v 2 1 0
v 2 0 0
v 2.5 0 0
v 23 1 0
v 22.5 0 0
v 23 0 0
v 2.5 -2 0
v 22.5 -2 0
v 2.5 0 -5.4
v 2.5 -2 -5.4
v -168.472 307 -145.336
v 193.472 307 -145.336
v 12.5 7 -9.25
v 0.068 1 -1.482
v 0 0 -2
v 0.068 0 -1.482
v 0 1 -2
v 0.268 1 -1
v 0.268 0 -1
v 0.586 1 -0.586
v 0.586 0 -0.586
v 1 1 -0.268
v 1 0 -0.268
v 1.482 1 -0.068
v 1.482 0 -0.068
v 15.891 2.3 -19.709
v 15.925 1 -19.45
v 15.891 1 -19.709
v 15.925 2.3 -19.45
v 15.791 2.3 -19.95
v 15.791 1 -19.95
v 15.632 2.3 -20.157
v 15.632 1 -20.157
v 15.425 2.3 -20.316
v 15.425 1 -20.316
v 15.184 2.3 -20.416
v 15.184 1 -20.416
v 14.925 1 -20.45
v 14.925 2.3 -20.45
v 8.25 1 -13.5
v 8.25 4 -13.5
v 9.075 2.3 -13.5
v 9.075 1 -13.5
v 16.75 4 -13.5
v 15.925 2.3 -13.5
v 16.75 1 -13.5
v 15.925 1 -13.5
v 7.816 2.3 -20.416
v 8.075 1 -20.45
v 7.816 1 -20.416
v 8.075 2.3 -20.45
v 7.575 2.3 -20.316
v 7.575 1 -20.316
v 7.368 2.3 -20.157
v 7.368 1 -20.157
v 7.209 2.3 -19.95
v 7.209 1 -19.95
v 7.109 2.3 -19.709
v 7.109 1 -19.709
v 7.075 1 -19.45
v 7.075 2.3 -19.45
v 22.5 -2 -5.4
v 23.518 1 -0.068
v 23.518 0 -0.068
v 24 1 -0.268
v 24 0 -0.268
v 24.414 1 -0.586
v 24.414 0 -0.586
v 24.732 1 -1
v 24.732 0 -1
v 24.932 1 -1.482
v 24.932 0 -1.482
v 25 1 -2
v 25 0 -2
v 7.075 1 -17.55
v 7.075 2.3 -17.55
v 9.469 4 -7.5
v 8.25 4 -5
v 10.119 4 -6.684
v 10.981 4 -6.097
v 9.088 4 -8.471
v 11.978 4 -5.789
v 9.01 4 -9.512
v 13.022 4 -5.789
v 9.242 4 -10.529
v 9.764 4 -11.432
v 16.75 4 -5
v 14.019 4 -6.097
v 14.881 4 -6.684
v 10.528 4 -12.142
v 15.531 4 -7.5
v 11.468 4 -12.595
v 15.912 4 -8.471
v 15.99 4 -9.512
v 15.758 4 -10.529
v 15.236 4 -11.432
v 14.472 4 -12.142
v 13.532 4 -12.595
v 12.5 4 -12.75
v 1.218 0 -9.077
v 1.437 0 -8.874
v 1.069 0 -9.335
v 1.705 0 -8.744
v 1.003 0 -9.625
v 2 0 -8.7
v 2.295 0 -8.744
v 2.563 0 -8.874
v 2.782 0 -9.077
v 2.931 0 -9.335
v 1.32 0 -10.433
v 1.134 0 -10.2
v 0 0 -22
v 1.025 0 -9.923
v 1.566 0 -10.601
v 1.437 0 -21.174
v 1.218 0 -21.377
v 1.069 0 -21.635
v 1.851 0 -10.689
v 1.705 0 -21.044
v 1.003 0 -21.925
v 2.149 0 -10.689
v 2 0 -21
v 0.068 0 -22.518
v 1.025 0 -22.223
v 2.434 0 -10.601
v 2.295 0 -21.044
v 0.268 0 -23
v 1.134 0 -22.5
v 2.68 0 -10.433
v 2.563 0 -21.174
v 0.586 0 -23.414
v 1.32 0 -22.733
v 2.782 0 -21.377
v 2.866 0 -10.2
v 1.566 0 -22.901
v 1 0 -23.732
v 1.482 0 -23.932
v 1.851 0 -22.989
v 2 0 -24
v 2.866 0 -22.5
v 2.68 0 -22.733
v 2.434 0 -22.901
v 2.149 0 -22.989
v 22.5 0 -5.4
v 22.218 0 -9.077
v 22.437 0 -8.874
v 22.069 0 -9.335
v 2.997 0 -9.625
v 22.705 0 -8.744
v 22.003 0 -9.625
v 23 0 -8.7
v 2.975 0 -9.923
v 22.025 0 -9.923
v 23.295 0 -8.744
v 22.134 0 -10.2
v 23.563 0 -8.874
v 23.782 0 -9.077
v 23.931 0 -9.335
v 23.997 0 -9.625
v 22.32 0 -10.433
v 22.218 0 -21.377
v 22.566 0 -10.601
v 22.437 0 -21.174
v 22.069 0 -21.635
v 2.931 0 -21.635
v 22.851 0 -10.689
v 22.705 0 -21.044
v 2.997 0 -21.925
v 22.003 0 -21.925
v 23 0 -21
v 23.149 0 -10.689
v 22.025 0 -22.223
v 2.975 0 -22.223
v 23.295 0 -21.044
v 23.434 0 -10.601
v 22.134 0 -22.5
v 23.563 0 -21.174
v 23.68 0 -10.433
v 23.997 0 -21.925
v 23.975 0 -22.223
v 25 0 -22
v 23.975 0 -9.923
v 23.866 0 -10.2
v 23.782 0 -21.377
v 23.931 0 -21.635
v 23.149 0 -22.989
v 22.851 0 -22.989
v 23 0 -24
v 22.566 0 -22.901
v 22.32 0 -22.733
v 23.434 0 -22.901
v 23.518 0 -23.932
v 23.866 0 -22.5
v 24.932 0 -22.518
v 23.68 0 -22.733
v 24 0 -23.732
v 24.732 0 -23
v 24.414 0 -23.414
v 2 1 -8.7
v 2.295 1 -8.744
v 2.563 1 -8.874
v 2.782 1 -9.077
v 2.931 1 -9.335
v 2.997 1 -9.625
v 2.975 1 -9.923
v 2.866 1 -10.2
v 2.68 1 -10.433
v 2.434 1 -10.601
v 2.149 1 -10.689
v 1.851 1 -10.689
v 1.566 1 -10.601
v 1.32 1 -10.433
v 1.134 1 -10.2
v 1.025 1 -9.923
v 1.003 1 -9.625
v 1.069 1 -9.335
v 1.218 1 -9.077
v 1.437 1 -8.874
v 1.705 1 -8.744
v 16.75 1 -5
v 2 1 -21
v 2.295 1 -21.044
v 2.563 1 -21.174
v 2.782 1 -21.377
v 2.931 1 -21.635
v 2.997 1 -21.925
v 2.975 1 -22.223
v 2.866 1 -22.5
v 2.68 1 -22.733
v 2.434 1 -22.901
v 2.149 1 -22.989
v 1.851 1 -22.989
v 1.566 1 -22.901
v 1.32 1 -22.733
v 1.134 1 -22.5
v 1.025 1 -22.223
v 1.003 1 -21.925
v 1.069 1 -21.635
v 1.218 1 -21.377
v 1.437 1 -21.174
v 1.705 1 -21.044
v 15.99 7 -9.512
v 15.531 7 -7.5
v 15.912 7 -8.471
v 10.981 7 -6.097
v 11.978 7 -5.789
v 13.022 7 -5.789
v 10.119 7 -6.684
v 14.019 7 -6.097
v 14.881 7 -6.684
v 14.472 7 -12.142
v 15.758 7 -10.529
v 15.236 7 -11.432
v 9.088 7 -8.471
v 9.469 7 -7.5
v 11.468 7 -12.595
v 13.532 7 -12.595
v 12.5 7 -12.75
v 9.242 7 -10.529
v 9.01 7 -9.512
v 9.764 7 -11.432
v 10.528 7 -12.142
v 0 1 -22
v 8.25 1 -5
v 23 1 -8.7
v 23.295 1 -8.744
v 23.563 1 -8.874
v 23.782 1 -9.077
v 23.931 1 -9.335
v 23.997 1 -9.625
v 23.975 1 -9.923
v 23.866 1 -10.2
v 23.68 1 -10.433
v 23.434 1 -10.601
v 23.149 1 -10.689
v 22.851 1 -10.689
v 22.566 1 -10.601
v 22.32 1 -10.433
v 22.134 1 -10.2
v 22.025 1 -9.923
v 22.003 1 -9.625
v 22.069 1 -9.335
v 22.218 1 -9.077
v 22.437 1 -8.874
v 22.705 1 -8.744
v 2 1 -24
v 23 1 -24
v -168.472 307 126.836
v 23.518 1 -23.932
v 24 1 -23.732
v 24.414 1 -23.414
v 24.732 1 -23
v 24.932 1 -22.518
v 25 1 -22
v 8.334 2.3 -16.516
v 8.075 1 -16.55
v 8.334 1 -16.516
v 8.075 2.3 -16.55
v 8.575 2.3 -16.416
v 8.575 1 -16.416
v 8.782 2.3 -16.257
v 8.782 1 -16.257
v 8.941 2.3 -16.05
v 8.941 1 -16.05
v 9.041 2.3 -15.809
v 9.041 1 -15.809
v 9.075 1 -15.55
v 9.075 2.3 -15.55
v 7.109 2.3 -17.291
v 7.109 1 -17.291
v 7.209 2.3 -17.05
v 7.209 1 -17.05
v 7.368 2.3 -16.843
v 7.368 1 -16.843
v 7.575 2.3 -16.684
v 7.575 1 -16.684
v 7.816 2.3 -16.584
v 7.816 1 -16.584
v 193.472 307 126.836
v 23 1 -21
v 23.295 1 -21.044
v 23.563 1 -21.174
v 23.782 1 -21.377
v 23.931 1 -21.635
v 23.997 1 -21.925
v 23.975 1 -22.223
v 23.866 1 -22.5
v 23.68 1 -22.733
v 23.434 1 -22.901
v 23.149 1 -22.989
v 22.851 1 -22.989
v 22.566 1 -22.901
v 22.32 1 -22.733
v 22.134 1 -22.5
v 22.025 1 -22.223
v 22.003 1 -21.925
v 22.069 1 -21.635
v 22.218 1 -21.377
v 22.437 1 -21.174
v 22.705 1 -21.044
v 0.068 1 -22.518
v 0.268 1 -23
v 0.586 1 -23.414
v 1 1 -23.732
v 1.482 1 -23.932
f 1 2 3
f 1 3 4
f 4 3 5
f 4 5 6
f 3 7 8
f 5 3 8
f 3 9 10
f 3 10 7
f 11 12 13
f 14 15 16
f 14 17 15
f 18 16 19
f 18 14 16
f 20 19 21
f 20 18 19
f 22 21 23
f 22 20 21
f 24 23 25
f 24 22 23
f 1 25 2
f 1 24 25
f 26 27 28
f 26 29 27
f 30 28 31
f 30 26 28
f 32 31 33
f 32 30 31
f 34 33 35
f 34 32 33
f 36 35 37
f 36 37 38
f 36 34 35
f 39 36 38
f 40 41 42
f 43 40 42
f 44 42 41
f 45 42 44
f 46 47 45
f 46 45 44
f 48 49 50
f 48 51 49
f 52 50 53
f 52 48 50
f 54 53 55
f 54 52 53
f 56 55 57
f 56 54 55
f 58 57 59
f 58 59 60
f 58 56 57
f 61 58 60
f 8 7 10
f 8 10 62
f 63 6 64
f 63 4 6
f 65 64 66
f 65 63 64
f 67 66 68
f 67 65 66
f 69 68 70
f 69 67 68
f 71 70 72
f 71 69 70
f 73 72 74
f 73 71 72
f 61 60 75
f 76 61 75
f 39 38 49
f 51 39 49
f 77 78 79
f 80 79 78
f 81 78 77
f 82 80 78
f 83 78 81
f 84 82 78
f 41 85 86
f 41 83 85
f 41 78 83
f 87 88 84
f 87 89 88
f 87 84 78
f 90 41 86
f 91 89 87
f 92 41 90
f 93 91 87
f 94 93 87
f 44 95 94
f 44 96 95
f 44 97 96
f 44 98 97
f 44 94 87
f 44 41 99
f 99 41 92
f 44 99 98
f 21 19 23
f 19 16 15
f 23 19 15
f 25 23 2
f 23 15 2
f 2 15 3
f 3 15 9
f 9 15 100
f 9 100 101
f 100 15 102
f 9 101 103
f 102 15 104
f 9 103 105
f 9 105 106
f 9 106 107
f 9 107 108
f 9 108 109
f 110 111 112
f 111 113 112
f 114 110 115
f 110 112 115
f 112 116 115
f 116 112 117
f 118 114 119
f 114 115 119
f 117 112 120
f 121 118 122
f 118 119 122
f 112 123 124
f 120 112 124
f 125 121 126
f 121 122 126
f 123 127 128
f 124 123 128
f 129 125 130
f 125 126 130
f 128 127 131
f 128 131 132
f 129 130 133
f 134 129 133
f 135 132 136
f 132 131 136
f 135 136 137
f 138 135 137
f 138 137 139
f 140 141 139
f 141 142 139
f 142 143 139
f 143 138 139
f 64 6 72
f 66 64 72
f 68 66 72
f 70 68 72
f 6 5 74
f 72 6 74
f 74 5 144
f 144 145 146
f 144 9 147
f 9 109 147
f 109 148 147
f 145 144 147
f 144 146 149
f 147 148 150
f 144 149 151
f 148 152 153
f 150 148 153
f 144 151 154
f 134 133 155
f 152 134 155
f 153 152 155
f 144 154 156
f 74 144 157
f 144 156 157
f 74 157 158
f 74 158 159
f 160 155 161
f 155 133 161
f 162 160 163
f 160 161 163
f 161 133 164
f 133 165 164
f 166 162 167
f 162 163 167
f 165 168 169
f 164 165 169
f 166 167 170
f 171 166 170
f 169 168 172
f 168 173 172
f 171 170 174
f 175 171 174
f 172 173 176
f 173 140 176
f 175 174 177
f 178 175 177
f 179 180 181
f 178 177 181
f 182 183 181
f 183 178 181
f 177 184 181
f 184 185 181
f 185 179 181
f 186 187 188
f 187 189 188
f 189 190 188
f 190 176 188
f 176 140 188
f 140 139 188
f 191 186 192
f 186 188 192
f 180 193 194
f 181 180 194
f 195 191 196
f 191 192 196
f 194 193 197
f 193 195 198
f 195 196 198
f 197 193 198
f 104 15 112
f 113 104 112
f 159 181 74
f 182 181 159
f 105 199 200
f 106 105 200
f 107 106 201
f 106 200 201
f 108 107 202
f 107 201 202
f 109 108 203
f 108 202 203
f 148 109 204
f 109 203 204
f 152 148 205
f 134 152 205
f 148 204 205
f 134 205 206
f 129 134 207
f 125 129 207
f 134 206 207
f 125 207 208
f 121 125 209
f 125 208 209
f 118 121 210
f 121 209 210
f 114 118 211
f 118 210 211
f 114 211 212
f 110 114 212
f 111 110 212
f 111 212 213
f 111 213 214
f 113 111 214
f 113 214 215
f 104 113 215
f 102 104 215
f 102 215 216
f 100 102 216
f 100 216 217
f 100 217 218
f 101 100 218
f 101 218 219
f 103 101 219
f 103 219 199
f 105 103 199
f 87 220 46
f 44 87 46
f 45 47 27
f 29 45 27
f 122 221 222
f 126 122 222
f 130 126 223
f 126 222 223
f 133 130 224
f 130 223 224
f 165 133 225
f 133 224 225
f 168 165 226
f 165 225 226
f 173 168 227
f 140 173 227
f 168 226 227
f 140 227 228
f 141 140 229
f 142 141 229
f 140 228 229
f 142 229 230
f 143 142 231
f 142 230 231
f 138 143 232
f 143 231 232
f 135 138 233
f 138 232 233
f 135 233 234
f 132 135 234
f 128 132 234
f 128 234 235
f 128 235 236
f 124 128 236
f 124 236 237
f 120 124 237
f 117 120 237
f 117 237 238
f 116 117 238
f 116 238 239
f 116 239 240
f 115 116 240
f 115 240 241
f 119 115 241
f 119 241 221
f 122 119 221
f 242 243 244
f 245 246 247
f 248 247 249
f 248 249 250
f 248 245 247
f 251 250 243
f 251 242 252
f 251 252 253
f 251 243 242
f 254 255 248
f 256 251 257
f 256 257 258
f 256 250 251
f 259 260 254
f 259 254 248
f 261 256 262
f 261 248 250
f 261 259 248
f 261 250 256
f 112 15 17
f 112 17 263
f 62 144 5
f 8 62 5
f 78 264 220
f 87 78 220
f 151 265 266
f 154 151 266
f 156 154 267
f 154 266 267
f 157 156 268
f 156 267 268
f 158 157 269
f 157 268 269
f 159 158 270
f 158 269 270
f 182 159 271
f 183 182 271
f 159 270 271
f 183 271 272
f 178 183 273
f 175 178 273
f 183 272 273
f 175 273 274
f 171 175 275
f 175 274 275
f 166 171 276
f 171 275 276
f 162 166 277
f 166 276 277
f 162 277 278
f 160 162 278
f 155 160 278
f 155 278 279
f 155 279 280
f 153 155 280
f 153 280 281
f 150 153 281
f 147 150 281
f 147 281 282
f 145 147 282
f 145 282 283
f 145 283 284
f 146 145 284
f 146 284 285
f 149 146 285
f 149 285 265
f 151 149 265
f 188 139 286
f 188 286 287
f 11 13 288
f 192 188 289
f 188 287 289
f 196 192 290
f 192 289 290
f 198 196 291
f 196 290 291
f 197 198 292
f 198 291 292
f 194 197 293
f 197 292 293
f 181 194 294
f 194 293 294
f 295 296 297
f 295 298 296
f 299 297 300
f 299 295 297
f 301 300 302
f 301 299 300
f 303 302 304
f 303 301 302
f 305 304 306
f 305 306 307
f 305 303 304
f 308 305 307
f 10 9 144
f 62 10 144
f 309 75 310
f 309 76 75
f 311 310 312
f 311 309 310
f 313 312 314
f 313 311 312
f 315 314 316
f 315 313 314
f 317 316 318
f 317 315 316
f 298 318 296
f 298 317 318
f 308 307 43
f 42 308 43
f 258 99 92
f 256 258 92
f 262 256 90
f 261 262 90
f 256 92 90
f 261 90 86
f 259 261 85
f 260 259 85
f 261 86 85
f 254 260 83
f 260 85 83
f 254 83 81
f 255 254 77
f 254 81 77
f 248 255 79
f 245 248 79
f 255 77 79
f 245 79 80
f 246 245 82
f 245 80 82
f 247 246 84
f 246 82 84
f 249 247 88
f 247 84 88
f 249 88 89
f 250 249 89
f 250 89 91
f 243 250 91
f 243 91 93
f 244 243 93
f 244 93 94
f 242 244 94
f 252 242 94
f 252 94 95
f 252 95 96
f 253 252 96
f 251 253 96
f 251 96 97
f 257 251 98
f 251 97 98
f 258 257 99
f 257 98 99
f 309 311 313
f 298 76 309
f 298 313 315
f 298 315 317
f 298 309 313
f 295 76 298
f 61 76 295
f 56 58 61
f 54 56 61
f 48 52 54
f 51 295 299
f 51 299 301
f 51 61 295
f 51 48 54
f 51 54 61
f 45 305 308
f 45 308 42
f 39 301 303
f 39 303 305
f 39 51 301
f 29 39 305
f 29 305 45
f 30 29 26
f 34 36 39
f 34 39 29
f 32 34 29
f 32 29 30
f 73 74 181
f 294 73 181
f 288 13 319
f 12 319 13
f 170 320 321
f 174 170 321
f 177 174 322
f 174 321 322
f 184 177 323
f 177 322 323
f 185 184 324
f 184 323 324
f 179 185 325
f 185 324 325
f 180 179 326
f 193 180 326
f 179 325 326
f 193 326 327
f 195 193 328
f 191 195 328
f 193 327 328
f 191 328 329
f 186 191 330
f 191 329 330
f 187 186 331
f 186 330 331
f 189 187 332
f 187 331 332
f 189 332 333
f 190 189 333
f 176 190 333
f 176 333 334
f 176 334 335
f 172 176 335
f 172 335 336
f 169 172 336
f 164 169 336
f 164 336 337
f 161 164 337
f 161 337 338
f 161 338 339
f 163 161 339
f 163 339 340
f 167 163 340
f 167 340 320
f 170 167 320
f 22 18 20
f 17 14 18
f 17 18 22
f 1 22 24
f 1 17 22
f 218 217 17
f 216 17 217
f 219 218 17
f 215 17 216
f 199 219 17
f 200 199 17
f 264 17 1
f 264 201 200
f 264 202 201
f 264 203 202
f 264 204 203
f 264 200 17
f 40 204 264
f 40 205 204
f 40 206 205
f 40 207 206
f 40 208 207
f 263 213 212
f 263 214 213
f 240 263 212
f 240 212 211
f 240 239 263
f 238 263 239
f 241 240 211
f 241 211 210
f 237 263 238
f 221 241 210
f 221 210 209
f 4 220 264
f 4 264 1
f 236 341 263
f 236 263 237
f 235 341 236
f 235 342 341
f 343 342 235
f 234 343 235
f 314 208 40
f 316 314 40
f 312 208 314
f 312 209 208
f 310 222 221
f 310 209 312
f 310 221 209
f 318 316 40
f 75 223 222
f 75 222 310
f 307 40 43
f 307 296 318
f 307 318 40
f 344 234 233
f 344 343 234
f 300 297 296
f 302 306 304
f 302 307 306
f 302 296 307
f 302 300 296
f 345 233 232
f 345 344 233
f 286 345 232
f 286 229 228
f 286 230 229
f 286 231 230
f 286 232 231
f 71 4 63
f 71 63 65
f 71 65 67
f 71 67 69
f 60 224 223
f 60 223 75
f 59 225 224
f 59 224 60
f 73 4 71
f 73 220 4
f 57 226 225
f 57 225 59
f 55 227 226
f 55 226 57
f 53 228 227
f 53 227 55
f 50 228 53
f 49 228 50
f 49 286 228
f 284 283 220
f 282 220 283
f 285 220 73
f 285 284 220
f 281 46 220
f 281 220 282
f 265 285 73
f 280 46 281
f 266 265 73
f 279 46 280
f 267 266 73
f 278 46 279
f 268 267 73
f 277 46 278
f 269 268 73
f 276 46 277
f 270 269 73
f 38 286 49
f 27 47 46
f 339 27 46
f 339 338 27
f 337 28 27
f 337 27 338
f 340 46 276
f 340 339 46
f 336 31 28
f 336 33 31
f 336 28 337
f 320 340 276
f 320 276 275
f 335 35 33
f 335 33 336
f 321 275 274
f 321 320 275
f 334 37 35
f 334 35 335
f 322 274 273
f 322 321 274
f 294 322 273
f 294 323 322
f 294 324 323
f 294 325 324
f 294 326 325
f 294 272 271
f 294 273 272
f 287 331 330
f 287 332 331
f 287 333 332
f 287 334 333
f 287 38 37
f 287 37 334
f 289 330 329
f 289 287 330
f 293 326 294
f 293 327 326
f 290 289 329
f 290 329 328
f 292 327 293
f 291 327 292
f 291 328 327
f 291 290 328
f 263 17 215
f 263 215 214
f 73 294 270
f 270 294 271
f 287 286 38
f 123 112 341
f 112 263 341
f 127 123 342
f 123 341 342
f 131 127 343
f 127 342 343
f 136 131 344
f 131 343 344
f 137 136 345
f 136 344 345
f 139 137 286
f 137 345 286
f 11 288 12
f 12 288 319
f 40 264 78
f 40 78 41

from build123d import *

# Parameters (mm, degrees)
SKETCH1_W           = 25
SKETCH1_H           = 24
BOSS_EXTRUDE1_DEPTH = 1
SKETCH2_W           = 8.5
SKETCH2_H           = 8.5
BOSS_EXTRUDE2_DEPTH = 3
SKETCH3_R           = 3.5
BOSS_EXTRUDE3_DEPTH = 3
SKETCH4_W           = 20
SKETCH4_H           = 5.4
BOSS_EXTRUDE4_DEPTH = 2
SKETCH5_R           = 1
CUT_EXTRUDE1_DEPTH  = 36.17101079
FILLET1_R           = 2
BOSS_EXTRUDE5_DEPTH = 200
BOSS_EXTRUDE6_DEPTH = 200
BOSS_EXTRUDE7_DEPTH = 1.3
FILLET2_R           = 1


with BuildPart() as part:
    # Sketch1 → Boss-Extrude1 (new body)
    with BuildSketch(Plane(origin=(0, 0, 0), x_dir=(1, 0, 0), z_dir=(0, 1, 0))):
        with Locations((12.5, 12)):
            Rectangle(SKETCH1_W, SKETCH1_H)
    extrude(amount=BOSS_EXTRUDE1_DEPTH)

    # Sketch2 → Boss-Extrude2 (add)
    with BuildSketch(Plane(origin=(0, 1, 0), x_dir=(1, 0, 0), z_dir=(0, 1, 0))):
        with Locations((12.5, 9.25)):
            Rectangle(SKETCH2_W, SKETCH2_H)
    extrude(amount=BOSS_EXTRUDE2_DEPTH)

    # Sketch3 → Boss-Extrude3 (add)
    with BuildSketch(Plane(origin=(0, 4, 0), x_dir=(1, 0, 0), z_dir=(0, 1, 0))):
        with Locations(Location((12.5, 9.25, 0), (0, 0, 90))):
            Circle(SKETCH3_R)
    extrude(amount=BOSS_EXTRUDE3_DEPTH)

    # Sketch4 → Boss-Extrude4 (add)
    with BuildSketch(Plane.XZ):
        with Locations((12.5, -2.7)):
            Rectangle(SKETCH4_W, SKETCH4_H)
    extrude(amount=BOSS_EXTRUDE4_DEPTH)

    # Sketch5 → Cut-Extrude1 (cut, through all)
    with BuildSketch(Plane(origin=(0, 1, 0), x_dir=(1, 0, 0), z_dir=(0, 1, 0))):
        with Locations(Location((2, 9.7, 0), (0, 0, 270))):
            Circle(SKETCH5_R)
        with Locations(Location((2, 22, 0), (0, 0, 270))):
            Circle(SKETCH5_R)
        with Locations(Location((23, 22, 0), (0, 0, 270))):
            Circle(SKETCH5_R)
        with Locations(Location((23, 9.7, 0), (0, 0, 270))):
            Circle(SKETCH5_R)
    extrude(amount=-CUT_EXTRUDE1_DEPTH, mode=Mode.SUBTRACT)

    # Fillet1
    fillet1_edges = [part.edges().sort_by_distance(p)[0] for p in [
        (0, 0.5, -24),
        (25, 0.5, -24),
        (25, 0.5, 0),
        (0, 0.5, 0),
    ]]
    fillet(fillet1_edges, radius=FILLET1_R)

    # Sketch9 → Boss-Extrude7 (add)
    with BuildSketch(Plane(origin=(0, 1, 0), x_dir=(1, 0, 0), z_dir=(0, 1, 0))):
        Polygon((15.925, 13.5), (15.925, 20.45), (7.075, 20.45), (7.075, 16.55), (9.075, 16.55), (9.075, 13.5), align=None)
    extrude(amount=BOSS_EXTRUDE7_DEPTH)

    # Fillet2
    fillet2_edges = [part.edges().sort_by_distance(p)[0] for p in [
        (9.075, 1.65, -16.55),
        (7.075, 1.65, -16.55),
        (15.925, 1.65, -20.45),
        (7.075, 1.65, -20.45),
    ]]
    fillet(fillet2_edges, radius=FILLET2_R - 0.0001)  # a hair under: the kernel refuses the full size


with BuildPart() as body_2:
    # Sketch6 → Boss-Extrude5 (new, symmetric)
    with BuildSketch(Plane(origin=(0, 0, 0), x_dir=(0, 0, -1), z_dir=(1, 0, 0))):
        Polygon((9.25, 7), (-126.836035449, 307), (145.336035449, 307), align=None)
    extrude(amount=BOSS_EXTRUDE5_DEPTH, both=True)


with BuildPart() as body_3:
    # Sketch8 → Boss-Extrude6 (new, symmetric)
    with BuildSketch(Plane.XY):
        Polygon((12.5, 7), (-168.471570024, 307), (193.471570024, 307), align=None)
    extrude(amount=BOSS_EXTRUDE6_DEPTH, both=True)

    # Intersect1: read off the stored shape, not the designer's step
    # Intersect1: intersect body 2
    add(body_2.part, mode=Mode.INTERSECT)


solid = Compound([part.part, body_3.part])
